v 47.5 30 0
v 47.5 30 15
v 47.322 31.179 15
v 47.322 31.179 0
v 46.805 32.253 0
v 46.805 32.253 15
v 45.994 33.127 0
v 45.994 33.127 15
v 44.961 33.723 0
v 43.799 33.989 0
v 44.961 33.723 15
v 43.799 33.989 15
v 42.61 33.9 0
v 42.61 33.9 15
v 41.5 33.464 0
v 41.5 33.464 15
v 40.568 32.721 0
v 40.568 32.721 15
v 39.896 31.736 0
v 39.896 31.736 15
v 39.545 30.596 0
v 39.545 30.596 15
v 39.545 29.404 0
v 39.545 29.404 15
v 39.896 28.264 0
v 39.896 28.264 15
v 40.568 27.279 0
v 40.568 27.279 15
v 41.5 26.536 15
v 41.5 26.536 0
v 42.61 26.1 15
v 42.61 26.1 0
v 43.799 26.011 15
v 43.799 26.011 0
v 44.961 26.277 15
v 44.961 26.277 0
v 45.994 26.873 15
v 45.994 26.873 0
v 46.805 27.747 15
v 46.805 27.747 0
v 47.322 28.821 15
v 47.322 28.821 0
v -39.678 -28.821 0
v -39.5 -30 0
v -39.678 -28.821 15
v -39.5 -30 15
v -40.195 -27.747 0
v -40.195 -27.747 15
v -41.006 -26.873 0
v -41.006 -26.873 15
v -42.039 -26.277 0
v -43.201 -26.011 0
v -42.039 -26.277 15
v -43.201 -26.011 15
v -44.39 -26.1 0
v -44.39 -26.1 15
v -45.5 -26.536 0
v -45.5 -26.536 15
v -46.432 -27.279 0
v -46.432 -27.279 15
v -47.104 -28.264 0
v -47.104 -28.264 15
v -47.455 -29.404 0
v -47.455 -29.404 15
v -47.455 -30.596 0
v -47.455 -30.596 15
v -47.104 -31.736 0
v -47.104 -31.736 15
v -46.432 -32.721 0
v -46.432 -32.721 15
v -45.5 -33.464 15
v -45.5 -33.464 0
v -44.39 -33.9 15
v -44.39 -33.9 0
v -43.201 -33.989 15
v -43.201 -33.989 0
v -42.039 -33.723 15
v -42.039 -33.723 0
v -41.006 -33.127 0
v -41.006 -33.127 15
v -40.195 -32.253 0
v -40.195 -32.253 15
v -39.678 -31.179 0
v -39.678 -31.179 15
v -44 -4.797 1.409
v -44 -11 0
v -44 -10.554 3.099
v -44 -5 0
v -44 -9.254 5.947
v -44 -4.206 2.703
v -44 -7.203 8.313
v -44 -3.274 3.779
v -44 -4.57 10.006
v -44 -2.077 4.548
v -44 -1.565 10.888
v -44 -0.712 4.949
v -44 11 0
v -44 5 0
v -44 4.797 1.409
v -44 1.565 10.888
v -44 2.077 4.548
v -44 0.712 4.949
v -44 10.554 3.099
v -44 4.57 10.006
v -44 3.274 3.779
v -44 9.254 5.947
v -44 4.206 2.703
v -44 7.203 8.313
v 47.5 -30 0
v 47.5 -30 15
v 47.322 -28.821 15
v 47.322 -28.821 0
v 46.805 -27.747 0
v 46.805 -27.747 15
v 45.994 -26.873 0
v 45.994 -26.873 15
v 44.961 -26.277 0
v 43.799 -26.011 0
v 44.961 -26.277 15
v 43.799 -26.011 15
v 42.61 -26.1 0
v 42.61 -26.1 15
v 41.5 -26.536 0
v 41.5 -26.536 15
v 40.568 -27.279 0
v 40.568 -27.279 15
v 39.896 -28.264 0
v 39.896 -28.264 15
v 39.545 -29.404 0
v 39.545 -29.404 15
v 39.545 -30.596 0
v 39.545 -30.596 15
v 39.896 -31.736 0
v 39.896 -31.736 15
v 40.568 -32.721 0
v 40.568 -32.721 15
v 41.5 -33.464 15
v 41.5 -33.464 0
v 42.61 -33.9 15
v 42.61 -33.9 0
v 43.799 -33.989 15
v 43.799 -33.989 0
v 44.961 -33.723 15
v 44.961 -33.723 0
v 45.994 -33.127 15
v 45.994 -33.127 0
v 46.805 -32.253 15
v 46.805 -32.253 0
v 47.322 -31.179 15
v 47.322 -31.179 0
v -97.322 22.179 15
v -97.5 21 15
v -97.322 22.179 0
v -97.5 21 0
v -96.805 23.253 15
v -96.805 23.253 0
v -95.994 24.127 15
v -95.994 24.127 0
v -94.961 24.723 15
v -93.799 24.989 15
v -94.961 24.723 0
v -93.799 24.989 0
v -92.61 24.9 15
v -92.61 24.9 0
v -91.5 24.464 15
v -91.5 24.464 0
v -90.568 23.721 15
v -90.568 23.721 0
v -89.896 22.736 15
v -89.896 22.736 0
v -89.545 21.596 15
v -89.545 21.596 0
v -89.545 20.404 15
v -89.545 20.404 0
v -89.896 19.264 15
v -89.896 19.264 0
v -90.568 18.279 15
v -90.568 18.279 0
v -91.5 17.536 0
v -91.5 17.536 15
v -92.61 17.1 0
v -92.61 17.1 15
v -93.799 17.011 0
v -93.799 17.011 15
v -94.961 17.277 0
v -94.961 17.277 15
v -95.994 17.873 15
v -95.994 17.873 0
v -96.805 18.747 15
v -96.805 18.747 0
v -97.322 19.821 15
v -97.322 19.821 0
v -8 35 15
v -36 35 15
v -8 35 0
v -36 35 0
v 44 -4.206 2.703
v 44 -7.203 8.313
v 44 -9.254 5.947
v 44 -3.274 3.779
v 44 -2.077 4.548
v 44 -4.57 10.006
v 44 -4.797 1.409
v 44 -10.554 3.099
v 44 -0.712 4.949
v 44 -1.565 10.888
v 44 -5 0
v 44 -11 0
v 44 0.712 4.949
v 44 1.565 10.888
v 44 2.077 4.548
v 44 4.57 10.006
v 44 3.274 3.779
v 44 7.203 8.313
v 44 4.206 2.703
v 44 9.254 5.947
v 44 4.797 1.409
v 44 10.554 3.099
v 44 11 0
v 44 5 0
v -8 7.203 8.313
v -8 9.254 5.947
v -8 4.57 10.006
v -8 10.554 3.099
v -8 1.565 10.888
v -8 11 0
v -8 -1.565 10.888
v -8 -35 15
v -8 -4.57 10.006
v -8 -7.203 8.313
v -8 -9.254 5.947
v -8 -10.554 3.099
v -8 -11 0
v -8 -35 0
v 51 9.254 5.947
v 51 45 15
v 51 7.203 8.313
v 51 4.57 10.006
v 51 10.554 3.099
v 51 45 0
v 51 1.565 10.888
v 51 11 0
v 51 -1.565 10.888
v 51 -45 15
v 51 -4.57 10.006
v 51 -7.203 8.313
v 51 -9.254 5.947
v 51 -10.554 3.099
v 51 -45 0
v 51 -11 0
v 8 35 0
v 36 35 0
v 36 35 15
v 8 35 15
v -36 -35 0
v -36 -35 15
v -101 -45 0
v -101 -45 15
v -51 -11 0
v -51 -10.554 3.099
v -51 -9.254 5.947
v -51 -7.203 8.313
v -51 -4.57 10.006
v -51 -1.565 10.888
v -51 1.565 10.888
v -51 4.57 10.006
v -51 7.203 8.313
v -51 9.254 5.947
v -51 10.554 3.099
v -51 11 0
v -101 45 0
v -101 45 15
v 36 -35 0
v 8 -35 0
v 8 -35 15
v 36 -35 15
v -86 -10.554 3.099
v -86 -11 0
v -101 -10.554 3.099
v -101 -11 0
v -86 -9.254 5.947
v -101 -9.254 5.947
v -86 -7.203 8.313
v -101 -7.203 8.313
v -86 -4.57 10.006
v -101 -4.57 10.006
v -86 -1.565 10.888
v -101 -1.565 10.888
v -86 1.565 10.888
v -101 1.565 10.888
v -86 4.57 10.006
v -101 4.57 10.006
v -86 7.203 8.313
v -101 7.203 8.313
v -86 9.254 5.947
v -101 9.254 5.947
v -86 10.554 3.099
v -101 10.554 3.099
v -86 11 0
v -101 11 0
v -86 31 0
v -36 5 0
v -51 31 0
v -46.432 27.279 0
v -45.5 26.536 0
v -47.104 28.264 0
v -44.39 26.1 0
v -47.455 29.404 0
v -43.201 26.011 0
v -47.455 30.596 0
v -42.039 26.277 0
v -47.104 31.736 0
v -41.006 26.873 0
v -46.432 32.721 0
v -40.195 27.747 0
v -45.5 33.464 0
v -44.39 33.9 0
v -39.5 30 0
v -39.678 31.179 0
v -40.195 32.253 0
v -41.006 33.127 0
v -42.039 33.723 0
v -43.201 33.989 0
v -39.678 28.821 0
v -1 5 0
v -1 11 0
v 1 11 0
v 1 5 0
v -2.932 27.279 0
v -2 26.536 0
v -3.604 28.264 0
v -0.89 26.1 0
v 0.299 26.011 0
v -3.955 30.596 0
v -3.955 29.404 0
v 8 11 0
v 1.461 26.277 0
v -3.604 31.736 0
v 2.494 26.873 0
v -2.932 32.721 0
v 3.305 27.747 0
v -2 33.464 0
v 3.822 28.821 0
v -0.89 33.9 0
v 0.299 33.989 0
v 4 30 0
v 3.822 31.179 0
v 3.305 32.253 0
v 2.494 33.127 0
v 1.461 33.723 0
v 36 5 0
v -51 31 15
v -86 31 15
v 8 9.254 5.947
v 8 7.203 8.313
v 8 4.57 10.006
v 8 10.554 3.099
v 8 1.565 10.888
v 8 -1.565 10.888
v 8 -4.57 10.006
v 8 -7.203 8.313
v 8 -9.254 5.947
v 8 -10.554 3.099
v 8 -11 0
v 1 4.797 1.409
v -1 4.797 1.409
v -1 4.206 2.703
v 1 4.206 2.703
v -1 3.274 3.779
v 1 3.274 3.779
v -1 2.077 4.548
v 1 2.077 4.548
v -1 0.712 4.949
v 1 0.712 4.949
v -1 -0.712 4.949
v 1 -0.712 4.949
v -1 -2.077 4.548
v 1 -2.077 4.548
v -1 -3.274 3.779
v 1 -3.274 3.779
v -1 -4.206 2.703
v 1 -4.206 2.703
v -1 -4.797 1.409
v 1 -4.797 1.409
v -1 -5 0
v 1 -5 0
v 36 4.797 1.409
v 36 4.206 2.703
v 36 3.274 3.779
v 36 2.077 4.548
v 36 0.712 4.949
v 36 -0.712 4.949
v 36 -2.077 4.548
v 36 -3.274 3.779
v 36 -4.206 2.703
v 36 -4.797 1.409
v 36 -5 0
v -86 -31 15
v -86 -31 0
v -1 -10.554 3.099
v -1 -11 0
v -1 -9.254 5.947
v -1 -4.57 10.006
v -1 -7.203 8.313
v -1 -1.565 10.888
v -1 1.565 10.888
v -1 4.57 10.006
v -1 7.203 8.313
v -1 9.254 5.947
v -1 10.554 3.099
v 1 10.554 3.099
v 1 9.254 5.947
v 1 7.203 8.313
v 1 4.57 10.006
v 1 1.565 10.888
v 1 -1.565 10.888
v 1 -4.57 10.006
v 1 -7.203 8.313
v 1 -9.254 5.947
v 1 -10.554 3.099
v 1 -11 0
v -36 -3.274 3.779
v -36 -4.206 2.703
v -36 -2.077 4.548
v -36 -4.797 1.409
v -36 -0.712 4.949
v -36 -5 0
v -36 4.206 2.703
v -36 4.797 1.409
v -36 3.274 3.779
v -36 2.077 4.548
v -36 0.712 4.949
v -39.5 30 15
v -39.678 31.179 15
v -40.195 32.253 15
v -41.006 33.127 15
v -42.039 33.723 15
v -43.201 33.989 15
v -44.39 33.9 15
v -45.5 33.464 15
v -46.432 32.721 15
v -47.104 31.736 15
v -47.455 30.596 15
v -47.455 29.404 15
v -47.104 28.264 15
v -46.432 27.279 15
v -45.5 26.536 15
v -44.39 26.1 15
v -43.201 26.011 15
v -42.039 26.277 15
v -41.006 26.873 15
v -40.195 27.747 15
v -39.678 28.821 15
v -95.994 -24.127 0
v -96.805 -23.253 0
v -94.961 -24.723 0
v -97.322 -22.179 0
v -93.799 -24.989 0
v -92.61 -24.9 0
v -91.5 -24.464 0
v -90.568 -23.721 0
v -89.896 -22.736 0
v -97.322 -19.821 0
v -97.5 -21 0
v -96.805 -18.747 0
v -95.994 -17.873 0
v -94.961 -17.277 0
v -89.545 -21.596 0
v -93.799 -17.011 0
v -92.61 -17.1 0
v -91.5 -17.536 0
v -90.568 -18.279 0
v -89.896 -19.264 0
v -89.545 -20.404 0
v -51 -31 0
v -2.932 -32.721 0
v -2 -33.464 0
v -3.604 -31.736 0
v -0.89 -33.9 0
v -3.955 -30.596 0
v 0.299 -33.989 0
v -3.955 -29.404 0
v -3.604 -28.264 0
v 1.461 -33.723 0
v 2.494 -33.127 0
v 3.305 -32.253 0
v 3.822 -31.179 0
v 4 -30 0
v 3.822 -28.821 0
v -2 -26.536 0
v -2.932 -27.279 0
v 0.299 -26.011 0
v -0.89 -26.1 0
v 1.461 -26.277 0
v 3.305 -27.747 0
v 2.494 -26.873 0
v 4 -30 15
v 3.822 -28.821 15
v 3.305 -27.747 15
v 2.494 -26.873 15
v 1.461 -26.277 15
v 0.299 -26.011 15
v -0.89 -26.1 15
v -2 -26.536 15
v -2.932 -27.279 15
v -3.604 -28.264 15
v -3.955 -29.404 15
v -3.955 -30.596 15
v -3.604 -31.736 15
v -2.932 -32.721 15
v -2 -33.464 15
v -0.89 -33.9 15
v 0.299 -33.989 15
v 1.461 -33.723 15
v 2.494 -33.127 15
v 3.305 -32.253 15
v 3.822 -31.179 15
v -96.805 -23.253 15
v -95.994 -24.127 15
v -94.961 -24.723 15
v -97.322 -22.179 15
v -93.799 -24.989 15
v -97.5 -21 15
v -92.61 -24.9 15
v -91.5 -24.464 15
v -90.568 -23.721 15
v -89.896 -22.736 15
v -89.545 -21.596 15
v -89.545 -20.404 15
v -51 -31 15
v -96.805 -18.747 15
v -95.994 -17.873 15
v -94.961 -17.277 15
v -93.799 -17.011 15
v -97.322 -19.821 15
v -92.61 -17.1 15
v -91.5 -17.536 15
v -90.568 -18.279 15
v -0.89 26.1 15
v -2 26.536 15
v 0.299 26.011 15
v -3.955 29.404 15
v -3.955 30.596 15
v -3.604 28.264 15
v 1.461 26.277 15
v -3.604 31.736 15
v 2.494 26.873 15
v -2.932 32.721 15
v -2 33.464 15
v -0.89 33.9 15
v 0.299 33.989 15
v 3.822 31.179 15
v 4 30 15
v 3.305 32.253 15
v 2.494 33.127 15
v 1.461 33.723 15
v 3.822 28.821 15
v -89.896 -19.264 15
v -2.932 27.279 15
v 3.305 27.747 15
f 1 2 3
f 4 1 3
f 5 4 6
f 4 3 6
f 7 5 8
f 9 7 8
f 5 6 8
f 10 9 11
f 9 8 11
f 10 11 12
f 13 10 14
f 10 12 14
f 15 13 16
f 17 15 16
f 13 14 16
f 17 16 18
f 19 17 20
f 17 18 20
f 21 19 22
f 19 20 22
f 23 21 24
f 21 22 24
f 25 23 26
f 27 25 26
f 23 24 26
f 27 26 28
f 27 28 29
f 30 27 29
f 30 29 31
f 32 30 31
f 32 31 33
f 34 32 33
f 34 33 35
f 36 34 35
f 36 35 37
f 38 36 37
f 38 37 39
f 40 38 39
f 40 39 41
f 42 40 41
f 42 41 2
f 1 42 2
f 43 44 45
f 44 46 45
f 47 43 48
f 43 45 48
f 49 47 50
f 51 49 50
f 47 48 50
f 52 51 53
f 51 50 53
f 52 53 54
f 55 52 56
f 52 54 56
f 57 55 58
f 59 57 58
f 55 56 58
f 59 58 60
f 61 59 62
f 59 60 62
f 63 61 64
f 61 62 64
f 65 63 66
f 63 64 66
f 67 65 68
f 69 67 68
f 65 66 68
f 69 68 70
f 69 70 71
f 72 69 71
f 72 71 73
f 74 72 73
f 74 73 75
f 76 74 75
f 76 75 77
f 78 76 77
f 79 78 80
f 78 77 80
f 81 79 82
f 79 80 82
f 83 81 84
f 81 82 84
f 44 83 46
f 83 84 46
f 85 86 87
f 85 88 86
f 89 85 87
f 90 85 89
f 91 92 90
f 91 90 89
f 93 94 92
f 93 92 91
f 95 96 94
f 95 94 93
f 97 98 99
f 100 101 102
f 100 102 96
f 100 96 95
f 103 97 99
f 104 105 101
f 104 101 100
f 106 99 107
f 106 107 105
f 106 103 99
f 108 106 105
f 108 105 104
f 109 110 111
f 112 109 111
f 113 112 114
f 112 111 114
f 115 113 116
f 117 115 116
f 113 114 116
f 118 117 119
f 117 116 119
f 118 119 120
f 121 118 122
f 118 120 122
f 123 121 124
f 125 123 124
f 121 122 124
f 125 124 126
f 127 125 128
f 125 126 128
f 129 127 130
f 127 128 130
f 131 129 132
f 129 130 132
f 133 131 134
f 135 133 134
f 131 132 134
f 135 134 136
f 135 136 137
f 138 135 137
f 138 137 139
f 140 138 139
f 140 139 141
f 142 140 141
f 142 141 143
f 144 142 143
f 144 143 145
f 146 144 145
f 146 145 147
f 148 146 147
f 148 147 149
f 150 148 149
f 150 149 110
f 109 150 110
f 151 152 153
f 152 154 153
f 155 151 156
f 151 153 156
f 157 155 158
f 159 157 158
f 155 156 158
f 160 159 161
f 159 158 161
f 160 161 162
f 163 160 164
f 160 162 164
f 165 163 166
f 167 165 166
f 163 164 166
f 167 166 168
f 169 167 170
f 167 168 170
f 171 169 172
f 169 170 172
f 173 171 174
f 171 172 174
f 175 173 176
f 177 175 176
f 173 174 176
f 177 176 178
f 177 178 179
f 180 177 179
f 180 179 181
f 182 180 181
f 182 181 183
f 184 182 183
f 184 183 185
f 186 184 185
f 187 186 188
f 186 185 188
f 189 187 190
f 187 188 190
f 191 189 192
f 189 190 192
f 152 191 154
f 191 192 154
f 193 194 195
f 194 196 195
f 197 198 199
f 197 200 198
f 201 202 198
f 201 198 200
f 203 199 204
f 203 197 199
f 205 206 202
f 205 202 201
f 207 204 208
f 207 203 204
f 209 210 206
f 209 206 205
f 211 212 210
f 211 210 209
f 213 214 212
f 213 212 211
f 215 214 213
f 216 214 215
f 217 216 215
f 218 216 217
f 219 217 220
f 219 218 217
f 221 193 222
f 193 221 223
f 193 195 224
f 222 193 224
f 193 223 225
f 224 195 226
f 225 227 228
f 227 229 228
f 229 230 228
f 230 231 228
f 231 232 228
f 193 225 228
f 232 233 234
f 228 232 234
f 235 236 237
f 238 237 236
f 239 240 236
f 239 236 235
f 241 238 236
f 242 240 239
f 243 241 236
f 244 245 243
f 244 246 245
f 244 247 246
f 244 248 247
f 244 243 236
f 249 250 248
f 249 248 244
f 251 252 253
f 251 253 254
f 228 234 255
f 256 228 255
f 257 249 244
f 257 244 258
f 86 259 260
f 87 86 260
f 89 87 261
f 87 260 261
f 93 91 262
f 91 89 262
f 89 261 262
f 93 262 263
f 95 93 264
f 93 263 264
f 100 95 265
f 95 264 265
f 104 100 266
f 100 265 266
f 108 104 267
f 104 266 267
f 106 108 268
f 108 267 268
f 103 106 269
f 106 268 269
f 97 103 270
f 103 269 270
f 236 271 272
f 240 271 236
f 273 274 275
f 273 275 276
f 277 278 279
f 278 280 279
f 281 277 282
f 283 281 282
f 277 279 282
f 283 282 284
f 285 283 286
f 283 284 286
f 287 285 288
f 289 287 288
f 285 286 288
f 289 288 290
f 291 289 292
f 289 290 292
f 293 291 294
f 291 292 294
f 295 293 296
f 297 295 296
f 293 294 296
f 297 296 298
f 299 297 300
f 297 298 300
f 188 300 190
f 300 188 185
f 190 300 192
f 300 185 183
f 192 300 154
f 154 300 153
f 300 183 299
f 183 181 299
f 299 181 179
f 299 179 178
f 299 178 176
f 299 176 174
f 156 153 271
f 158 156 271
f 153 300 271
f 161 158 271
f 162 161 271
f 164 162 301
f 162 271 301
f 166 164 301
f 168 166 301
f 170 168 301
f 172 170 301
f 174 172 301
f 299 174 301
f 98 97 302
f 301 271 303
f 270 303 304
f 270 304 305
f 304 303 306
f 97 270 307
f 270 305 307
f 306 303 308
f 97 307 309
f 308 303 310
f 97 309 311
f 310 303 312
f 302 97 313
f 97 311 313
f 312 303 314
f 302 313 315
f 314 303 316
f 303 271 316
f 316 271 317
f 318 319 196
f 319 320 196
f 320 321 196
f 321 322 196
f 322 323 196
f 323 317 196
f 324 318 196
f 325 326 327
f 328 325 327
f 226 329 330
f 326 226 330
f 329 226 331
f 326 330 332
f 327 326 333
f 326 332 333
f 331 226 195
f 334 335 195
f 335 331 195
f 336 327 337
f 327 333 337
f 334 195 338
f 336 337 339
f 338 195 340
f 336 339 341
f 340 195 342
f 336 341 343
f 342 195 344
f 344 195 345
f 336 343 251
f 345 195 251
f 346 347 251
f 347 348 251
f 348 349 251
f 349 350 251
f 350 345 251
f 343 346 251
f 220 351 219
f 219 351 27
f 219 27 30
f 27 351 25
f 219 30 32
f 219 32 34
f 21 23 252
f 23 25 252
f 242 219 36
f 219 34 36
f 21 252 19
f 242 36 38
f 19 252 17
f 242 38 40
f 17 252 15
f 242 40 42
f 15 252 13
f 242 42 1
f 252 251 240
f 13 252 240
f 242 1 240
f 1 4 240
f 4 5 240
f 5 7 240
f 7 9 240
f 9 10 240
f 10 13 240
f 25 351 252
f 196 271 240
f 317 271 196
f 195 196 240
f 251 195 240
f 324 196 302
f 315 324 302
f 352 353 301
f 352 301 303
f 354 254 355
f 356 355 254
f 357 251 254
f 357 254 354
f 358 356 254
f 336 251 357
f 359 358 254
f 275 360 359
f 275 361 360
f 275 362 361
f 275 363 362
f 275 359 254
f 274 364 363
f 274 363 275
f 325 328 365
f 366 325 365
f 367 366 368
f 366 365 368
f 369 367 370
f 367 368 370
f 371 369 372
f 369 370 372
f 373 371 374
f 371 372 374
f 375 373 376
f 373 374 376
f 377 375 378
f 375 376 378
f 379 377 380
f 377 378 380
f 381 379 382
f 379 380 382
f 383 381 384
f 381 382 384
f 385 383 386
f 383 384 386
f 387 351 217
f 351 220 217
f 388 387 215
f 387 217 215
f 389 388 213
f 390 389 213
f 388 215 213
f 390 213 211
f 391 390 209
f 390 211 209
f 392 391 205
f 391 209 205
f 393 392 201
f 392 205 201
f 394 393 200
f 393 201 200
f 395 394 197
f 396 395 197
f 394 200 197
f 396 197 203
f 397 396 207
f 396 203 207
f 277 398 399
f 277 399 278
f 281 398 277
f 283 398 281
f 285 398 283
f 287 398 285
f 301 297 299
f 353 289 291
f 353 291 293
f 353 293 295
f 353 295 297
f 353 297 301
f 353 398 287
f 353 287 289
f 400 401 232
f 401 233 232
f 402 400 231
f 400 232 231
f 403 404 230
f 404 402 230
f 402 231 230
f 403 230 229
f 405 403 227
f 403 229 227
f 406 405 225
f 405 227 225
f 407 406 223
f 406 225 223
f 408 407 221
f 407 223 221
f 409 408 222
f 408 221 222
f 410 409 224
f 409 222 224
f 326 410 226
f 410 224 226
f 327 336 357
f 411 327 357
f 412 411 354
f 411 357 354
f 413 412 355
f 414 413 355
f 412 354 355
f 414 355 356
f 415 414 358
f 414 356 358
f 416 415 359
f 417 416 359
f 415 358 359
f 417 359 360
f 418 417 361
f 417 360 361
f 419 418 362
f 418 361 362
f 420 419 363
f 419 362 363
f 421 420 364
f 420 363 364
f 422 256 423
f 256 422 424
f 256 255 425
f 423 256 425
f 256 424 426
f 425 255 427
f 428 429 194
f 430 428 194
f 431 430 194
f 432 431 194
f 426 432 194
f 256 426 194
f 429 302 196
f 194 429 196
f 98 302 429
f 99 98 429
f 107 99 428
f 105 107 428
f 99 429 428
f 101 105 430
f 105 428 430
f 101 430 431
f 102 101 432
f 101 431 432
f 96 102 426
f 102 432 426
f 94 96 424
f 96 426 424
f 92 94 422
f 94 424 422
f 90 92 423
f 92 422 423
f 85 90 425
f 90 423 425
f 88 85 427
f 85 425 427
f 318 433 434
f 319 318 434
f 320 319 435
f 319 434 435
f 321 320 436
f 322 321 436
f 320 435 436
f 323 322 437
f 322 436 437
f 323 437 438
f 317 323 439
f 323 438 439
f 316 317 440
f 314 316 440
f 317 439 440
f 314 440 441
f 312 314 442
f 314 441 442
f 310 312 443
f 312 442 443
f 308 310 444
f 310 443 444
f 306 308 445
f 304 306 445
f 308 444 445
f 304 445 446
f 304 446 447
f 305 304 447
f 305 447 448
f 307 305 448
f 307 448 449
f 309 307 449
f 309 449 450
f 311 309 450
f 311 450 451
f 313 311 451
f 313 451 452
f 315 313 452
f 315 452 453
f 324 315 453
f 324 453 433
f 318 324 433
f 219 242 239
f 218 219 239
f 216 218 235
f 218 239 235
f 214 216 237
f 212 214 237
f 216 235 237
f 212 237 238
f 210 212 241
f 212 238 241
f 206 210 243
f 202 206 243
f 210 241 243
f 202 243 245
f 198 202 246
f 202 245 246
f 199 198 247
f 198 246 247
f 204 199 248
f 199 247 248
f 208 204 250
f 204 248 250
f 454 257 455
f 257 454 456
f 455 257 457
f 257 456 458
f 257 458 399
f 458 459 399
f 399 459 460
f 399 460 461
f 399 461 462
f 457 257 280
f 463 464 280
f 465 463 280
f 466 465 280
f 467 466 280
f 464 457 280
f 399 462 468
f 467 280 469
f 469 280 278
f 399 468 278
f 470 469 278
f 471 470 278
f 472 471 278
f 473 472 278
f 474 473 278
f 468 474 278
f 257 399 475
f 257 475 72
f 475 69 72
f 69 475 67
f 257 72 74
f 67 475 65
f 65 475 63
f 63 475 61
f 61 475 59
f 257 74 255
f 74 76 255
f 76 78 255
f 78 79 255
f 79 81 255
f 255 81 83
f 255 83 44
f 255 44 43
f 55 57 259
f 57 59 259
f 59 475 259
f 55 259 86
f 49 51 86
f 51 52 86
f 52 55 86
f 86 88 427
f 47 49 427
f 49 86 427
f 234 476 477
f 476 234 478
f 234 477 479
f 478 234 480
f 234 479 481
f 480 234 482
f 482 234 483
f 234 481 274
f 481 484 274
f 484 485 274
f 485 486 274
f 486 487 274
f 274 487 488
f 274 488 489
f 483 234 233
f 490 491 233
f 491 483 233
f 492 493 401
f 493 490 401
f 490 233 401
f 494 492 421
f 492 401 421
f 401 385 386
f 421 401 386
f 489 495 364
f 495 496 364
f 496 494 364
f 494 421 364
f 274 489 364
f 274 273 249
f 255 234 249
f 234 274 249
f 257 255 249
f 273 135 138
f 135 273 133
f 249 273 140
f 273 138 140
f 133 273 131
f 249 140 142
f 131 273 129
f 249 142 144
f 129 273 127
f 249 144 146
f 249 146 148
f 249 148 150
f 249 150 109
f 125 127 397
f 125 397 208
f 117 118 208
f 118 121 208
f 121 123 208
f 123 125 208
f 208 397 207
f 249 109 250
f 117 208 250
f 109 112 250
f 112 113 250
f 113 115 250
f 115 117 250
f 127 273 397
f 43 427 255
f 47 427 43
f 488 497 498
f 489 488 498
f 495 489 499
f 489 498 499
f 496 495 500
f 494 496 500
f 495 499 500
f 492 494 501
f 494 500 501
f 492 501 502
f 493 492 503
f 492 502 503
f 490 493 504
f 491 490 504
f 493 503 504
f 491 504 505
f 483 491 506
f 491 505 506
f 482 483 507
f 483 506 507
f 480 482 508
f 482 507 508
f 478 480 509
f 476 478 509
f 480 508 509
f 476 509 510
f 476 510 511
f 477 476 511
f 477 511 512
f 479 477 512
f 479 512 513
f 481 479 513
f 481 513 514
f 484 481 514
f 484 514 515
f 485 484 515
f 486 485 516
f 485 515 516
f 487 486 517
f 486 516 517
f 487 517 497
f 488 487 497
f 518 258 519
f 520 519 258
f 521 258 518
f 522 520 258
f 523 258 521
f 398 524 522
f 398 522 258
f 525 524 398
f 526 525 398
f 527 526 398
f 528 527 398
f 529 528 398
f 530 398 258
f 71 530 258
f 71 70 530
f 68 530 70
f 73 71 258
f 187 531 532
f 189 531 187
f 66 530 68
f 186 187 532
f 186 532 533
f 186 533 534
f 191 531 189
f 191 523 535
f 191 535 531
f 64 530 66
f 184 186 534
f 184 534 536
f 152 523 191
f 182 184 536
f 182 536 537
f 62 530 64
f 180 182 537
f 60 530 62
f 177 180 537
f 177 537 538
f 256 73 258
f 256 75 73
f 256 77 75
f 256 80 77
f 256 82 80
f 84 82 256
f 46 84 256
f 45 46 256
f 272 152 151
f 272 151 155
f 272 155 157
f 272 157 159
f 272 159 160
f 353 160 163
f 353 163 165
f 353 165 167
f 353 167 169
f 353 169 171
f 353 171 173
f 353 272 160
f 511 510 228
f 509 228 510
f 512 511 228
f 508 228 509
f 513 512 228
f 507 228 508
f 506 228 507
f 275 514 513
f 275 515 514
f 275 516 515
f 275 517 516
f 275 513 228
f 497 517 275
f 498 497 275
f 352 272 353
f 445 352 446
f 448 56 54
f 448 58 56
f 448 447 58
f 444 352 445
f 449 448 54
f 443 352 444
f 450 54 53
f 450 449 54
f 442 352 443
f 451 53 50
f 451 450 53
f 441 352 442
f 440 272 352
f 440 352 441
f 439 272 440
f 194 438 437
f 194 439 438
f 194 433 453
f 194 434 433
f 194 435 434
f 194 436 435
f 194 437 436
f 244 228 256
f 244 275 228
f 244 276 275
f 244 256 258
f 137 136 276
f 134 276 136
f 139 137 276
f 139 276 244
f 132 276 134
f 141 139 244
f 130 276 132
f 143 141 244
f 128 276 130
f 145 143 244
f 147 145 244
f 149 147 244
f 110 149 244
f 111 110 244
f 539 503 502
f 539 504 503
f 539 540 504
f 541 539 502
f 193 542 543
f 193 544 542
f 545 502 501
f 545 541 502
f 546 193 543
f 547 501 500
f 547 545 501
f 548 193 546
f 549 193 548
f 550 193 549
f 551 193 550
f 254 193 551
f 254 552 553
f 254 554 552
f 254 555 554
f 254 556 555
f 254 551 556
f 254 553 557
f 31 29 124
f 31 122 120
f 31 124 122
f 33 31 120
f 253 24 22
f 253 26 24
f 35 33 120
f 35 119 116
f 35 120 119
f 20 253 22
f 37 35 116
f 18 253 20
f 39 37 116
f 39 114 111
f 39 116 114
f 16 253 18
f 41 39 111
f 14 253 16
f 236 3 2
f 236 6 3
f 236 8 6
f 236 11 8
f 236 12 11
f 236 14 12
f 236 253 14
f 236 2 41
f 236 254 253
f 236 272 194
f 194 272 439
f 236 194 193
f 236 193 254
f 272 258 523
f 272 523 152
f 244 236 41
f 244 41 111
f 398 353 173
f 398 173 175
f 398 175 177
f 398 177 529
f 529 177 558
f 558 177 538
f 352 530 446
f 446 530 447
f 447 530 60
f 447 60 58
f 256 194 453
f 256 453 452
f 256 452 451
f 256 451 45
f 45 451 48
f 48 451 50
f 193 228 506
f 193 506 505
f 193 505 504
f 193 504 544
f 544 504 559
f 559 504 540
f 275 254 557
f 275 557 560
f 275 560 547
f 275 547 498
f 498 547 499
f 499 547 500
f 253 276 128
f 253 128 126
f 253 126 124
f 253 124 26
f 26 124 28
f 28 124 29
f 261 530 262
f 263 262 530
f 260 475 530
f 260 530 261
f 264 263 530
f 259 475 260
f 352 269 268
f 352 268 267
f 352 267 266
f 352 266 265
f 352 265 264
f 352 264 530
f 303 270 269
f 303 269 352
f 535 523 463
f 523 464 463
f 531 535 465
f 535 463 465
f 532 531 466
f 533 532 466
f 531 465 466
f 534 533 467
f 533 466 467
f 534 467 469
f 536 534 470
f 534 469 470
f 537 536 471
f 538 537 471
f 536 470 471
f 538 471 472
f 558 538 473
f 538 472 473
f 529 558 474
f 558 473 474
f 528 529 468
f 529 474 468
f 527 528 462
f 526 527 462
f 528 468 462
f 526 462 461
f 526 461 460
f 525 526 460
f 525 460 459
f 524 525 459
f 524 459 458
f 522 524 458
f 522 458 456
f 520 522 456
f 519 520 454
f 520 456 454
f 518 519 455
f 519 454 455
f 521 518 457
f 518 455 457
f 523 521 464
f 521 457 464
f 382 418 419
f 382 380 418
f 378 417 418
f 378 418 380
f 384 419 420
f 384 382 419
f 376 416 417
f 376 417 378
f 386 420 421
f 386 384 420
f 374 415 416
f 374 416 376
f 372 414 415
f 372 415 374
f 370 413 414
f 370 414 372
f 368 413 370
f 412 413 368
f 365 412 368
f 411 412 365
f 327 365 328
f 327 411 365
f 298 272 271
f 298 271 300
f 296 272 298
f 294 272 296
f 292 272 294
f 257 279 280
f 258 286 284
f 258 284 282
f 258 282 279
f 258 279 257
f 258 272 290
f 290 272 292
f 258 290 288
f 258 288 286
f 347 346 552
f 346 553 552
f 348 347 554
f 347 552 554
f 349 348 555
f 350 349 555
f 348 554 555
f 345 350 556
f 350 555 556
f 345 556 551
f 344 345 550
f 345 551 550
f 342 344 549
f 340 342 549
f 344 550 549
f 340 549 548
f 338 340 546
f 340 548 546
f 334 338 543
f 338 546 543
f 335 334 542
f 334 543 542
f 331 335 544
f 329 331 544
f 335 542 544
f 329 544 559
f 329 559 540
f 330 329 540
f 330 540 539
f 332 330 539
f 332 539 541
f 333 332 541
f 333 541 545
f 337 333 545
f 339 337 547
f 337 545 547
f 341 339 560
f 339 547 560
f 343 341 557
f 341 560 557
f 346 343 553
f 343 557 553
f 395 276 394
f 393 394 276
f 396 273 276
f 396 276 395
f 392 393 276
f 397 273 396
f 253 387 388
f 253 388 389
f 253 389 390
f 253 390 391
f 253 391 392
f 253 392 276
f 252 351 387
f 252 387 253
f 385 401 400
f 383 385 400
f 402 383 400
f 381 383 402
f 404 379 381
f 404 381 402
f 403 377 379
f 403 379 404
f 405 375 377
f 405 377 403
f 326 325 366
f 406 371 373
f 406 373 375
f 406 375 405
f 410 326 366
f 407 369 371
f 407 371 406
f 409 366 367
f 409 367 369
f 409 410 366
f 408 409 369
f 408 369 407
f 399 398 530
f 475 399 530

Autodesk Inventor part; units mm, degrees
ref_plane "YZ Plane" through (0, 0, 0) normal (1, 0, 0) x (0, 1, 0)
ref_plane "XZ Plane" through (0, 0, 0) normal (0, 1, 0) x (-1, 0, 0)
ref_plane "XY Plane" through (0, 0, 0) normal (0, 0, 1) x (1, 0, 0)
sketch "Sketch1" plane through (0, 0, 0) normal (0, 0, 1) x (1, 0, 0)
  line L0 (51, -45) -> (-51, -45)
  line L1 (-51, -45) -> (-51, 45)
  line L2 (-51, 45) -> (51, 45)
  line L3 (51, 45) -> (51, -45)
  line L4 (51, -45) -> (-51, 45) construction
  line L5 (-51, -45) -> (51, 45) construction
  line L6 (-22, 0) -> (22, 0) construction
  line L7 (-36, 35) -> (-8, 35)
  line L8 (-8, 35) -> (-8, -35)
  line L9 (-8, -35) -> (-36, -35)
  line L10 (-36, -35) -> (-36, 35)
  line L11 (-36, 35) -> (-8, -35) construction
  line L12 (-8, 35) -> (-36, -35) construction
  line L13 (36, 35) -> (8, 35)
  line L14 (8, 35) -> (8, -35)
  line L15 (8, -35) -> (36, -35)
  line L16 (36, -35) -> (36, 35)
  line L17 (36, 35) -> (8, -35) construction
  line L18 (8, 35) -> (36, -35) construction
  point P0 (0, 0)
  point P1 (0, 0)
  dimension "d0" = 16
  dimension "d1" = 28
  dimension "d2" = 28
  dimension "d3" = 70
  dimension "d4" = 10
  dimension "d5" = 15
extrude "Extrusion1" add sketch "Sketch1" along normal blind 15
sketch "Sketch2" plane through (51, -45, 0) normal (1, 0, 0) x (0, 0, -1)
  circle A0 centre (0, 45) radius 5
  point P0 (0, 45)
  dimension "d8" = 10
extrude "Extrusion2" cut sketch "Sketch2" against normal through all
sketch "Sketch3" plane through (51, -45, 15) normal (1, 0, 0) x (0, 0, -1)
  arc A0 (15, 50) -> (15, 40) centre (15, 45) ccw projected
  circle A1 centre (15, 45) radius 11
  dimension "d11" = 22
extrude "Extrusion3" cut sketch "Sketch3" against normal blind 7
sketch "Sketch4" plane through (-51, -45, 15) normal (-1, 0, 0) x (0, 0, 1)
  arc A0 (-15, 40) -> (-15, 50) centre (-15, 45) ccw projected
  circle A1 centre (-15, 45) radius 11
  dimension "d14" = 22
extrude "Extrusion4" cut sketch "Sketch4" against normal blind 7
sketch "Sketch5" plane through (-8, -35, 15) normal (-1, 0, 0) x (0, 0, 1)
  arc A0 (-15, 30) -> (-15, 40) centre (-15, 35) ccw projected
  circle A1 centre (-15, 35) radius 11
  dimension "d17" = 22
extrude "Extrusion5" cut sketch "Sketch5" against normal blind 7
sketch "Sketch6" plane through (8, -35, 15) normal (1, 0, 0) x (0, 0, -1)
  arc A0 (15, 40) -> (15, 30) centre (15, 35) ccw projected
  circle A1 centre (15, 35) radius 11
  dimension "d20" = 22
extrude "Extrusion6" cut sketch "Sketch6" against normal blind 7
sketch "Sketch7" plane through (0, 0, 15) normal (0, 0, 1) x (1, 0, 0)
  line L0 (-36, -35) -> (-36, 35) projected
  line L1 (-51, 45) -> (-51, -45) projected
  line L2 (0, 30) -> (0, -30) construction
  circle A0 centre (0, 30) radius 4
  circle A1 centre (0, -30) radius 4
  line L3 (43.5, -30) -> (-43.5, -30) construction
  line L4 (-43.5, -30) -> (-43.5, 30) construction
  line L5 (-43.5, 30) -> (43.5, 30) construction
  line L6 (43.5, 30) -> (43.5, -30) construction
  line L7 (43.5, -30) -> (-43.5, 30) construction
  line L8 (-43.5, -30) -> (43.5, 30) construction
  circle A2 centre (-43.5, 30) radius 4
  circle A3 centre (-43.5, -30) radius 4
  circle A4 centre (43.5, -30) radius 4
  circle A5 centre (43.5, 30) radius 4
  point P0 (0, 0)
  point P1 (0, 0)
  dimension "d23" = 60
  dimension "d24" = 8
  dimension "d25" = 7.5
  dimension "d26" = 87
extrude "Extrusion7" cut sketch "Sketch7" against normal through all
sketch "Sketch8" plane through (0, 0, 15) normal (0, 0, 1) x (1, 0, 0)
  line L0 (-51, 45) -> (-86, 45)
  line L1 (-86, 45) -> (-86, 31)
  line L2 (-86, 31) -> (-51, 31)
  line L3 (-51, 31) -> (-51, 45)
  line L4 (-51, -45) -> (-86, -45)
  line L5 (-86, -45) -> (-86, -31)
  line L6 (-86, -31) -> (-51, -31)
  line L7 (-51, -31) -> (-51, -45)
  line L8 (-86, 45) -> (-101, 45)
  line L9 (-101, 45) -> (-101, -45)
  line L10 (-101, -45) -> (-86, -45)
  line L11 (-86, -45) -> (-86, 45)
  point P0 (0, 0)
  dimension "d29" = 14
  dimension "d30" = 15
  dimension "d31" = 35
extrude "Extrusion8" add sketch "Sketch8" against normal up to surface (15 mm away)
sketch "Sketch9" plane through (-101, -45, 15) normal (-1, 0, 0) x (0, 0, 1)
  circle A0 centre (-15, 45) radius 11
  dimension "d34" = 22
extrude "Extrusion9" cut sketch "Sketch9" against normal up to surface (50 mm away)
sketch "Sketch10" plane through (0, 0, 0) normal (0, 0, -1) x (-1, 0, 0)
  line L0 (101, -11) -> (86, -11) projected
  circle A0 centre (43.5, 30) radius 4 projected
  circle A1 centre (0, 30) radius 4 projected
  circle A2 centre (-43.5, 30) radius 4 projected
  line L1 (86, 11) -> (101, 11) projected
  line L2 (101, 11) -> (101, 45) projected
  line L3 (101, 45) -> (-51, 45) projected
  line L4 (-51, 45) -> (-51, 11) projected
  line L5 (-51, 11) -> (-44, 11) projected
  line L6 (-44, 11) -> (-44, 5) projected
  line L7 (-44, 5) -> (-36, 5) projected
  line L8 (-36, 5) -> (-36, 35) projected
  line L9 (-36, 35) -> (-8, 35) projected
  line L10 (-8, 35) -> (-8, 11) projected
  line L11 (-8, 11) -> (-1, 11) projected
  line L12 (-1, 11) -> (-1, 5) projected
  line L13 (-1, 5) -> (1, 5) projected
  line L14 (1, 5) -> (1, 11) projected
  line L15 (1, 11) -> (8, 11) projected
  line L16 (8, 11) -> (8, 35) projected
  line L17 (8, 35) -> (36, 35) projected
  line L18 (36, 35) -> (36, 5) projected
  line L19 (36, 5) -> (44, 5) projected
  line L20 (44, 5) -> (44, 11) projected
  line L21 (44, 11) -> (51, 11) projected
  line L22 (51, 11) -> (51, 31) projected
  line L23 (51, 31) -> (86, 31) projected
  line L24 (86, 31) -> (86, 11) projected
  line L25 (93.5, 11) -> (93.5, 21) construction
  line L26 (93.5, -11) -> (93.5, -21) construction
  circle A3 centre (93.5, 21) radius 4
  circle A4 centre (93.5, -21) radius 4
  point P0 (0, 0)
  dimension "d37" = 8
  dimension "d38" = 10
extrude "Extrusion10" cut sketch "Sketch10" against normal through all contours A3 | A4
properties part number "frame 1"
